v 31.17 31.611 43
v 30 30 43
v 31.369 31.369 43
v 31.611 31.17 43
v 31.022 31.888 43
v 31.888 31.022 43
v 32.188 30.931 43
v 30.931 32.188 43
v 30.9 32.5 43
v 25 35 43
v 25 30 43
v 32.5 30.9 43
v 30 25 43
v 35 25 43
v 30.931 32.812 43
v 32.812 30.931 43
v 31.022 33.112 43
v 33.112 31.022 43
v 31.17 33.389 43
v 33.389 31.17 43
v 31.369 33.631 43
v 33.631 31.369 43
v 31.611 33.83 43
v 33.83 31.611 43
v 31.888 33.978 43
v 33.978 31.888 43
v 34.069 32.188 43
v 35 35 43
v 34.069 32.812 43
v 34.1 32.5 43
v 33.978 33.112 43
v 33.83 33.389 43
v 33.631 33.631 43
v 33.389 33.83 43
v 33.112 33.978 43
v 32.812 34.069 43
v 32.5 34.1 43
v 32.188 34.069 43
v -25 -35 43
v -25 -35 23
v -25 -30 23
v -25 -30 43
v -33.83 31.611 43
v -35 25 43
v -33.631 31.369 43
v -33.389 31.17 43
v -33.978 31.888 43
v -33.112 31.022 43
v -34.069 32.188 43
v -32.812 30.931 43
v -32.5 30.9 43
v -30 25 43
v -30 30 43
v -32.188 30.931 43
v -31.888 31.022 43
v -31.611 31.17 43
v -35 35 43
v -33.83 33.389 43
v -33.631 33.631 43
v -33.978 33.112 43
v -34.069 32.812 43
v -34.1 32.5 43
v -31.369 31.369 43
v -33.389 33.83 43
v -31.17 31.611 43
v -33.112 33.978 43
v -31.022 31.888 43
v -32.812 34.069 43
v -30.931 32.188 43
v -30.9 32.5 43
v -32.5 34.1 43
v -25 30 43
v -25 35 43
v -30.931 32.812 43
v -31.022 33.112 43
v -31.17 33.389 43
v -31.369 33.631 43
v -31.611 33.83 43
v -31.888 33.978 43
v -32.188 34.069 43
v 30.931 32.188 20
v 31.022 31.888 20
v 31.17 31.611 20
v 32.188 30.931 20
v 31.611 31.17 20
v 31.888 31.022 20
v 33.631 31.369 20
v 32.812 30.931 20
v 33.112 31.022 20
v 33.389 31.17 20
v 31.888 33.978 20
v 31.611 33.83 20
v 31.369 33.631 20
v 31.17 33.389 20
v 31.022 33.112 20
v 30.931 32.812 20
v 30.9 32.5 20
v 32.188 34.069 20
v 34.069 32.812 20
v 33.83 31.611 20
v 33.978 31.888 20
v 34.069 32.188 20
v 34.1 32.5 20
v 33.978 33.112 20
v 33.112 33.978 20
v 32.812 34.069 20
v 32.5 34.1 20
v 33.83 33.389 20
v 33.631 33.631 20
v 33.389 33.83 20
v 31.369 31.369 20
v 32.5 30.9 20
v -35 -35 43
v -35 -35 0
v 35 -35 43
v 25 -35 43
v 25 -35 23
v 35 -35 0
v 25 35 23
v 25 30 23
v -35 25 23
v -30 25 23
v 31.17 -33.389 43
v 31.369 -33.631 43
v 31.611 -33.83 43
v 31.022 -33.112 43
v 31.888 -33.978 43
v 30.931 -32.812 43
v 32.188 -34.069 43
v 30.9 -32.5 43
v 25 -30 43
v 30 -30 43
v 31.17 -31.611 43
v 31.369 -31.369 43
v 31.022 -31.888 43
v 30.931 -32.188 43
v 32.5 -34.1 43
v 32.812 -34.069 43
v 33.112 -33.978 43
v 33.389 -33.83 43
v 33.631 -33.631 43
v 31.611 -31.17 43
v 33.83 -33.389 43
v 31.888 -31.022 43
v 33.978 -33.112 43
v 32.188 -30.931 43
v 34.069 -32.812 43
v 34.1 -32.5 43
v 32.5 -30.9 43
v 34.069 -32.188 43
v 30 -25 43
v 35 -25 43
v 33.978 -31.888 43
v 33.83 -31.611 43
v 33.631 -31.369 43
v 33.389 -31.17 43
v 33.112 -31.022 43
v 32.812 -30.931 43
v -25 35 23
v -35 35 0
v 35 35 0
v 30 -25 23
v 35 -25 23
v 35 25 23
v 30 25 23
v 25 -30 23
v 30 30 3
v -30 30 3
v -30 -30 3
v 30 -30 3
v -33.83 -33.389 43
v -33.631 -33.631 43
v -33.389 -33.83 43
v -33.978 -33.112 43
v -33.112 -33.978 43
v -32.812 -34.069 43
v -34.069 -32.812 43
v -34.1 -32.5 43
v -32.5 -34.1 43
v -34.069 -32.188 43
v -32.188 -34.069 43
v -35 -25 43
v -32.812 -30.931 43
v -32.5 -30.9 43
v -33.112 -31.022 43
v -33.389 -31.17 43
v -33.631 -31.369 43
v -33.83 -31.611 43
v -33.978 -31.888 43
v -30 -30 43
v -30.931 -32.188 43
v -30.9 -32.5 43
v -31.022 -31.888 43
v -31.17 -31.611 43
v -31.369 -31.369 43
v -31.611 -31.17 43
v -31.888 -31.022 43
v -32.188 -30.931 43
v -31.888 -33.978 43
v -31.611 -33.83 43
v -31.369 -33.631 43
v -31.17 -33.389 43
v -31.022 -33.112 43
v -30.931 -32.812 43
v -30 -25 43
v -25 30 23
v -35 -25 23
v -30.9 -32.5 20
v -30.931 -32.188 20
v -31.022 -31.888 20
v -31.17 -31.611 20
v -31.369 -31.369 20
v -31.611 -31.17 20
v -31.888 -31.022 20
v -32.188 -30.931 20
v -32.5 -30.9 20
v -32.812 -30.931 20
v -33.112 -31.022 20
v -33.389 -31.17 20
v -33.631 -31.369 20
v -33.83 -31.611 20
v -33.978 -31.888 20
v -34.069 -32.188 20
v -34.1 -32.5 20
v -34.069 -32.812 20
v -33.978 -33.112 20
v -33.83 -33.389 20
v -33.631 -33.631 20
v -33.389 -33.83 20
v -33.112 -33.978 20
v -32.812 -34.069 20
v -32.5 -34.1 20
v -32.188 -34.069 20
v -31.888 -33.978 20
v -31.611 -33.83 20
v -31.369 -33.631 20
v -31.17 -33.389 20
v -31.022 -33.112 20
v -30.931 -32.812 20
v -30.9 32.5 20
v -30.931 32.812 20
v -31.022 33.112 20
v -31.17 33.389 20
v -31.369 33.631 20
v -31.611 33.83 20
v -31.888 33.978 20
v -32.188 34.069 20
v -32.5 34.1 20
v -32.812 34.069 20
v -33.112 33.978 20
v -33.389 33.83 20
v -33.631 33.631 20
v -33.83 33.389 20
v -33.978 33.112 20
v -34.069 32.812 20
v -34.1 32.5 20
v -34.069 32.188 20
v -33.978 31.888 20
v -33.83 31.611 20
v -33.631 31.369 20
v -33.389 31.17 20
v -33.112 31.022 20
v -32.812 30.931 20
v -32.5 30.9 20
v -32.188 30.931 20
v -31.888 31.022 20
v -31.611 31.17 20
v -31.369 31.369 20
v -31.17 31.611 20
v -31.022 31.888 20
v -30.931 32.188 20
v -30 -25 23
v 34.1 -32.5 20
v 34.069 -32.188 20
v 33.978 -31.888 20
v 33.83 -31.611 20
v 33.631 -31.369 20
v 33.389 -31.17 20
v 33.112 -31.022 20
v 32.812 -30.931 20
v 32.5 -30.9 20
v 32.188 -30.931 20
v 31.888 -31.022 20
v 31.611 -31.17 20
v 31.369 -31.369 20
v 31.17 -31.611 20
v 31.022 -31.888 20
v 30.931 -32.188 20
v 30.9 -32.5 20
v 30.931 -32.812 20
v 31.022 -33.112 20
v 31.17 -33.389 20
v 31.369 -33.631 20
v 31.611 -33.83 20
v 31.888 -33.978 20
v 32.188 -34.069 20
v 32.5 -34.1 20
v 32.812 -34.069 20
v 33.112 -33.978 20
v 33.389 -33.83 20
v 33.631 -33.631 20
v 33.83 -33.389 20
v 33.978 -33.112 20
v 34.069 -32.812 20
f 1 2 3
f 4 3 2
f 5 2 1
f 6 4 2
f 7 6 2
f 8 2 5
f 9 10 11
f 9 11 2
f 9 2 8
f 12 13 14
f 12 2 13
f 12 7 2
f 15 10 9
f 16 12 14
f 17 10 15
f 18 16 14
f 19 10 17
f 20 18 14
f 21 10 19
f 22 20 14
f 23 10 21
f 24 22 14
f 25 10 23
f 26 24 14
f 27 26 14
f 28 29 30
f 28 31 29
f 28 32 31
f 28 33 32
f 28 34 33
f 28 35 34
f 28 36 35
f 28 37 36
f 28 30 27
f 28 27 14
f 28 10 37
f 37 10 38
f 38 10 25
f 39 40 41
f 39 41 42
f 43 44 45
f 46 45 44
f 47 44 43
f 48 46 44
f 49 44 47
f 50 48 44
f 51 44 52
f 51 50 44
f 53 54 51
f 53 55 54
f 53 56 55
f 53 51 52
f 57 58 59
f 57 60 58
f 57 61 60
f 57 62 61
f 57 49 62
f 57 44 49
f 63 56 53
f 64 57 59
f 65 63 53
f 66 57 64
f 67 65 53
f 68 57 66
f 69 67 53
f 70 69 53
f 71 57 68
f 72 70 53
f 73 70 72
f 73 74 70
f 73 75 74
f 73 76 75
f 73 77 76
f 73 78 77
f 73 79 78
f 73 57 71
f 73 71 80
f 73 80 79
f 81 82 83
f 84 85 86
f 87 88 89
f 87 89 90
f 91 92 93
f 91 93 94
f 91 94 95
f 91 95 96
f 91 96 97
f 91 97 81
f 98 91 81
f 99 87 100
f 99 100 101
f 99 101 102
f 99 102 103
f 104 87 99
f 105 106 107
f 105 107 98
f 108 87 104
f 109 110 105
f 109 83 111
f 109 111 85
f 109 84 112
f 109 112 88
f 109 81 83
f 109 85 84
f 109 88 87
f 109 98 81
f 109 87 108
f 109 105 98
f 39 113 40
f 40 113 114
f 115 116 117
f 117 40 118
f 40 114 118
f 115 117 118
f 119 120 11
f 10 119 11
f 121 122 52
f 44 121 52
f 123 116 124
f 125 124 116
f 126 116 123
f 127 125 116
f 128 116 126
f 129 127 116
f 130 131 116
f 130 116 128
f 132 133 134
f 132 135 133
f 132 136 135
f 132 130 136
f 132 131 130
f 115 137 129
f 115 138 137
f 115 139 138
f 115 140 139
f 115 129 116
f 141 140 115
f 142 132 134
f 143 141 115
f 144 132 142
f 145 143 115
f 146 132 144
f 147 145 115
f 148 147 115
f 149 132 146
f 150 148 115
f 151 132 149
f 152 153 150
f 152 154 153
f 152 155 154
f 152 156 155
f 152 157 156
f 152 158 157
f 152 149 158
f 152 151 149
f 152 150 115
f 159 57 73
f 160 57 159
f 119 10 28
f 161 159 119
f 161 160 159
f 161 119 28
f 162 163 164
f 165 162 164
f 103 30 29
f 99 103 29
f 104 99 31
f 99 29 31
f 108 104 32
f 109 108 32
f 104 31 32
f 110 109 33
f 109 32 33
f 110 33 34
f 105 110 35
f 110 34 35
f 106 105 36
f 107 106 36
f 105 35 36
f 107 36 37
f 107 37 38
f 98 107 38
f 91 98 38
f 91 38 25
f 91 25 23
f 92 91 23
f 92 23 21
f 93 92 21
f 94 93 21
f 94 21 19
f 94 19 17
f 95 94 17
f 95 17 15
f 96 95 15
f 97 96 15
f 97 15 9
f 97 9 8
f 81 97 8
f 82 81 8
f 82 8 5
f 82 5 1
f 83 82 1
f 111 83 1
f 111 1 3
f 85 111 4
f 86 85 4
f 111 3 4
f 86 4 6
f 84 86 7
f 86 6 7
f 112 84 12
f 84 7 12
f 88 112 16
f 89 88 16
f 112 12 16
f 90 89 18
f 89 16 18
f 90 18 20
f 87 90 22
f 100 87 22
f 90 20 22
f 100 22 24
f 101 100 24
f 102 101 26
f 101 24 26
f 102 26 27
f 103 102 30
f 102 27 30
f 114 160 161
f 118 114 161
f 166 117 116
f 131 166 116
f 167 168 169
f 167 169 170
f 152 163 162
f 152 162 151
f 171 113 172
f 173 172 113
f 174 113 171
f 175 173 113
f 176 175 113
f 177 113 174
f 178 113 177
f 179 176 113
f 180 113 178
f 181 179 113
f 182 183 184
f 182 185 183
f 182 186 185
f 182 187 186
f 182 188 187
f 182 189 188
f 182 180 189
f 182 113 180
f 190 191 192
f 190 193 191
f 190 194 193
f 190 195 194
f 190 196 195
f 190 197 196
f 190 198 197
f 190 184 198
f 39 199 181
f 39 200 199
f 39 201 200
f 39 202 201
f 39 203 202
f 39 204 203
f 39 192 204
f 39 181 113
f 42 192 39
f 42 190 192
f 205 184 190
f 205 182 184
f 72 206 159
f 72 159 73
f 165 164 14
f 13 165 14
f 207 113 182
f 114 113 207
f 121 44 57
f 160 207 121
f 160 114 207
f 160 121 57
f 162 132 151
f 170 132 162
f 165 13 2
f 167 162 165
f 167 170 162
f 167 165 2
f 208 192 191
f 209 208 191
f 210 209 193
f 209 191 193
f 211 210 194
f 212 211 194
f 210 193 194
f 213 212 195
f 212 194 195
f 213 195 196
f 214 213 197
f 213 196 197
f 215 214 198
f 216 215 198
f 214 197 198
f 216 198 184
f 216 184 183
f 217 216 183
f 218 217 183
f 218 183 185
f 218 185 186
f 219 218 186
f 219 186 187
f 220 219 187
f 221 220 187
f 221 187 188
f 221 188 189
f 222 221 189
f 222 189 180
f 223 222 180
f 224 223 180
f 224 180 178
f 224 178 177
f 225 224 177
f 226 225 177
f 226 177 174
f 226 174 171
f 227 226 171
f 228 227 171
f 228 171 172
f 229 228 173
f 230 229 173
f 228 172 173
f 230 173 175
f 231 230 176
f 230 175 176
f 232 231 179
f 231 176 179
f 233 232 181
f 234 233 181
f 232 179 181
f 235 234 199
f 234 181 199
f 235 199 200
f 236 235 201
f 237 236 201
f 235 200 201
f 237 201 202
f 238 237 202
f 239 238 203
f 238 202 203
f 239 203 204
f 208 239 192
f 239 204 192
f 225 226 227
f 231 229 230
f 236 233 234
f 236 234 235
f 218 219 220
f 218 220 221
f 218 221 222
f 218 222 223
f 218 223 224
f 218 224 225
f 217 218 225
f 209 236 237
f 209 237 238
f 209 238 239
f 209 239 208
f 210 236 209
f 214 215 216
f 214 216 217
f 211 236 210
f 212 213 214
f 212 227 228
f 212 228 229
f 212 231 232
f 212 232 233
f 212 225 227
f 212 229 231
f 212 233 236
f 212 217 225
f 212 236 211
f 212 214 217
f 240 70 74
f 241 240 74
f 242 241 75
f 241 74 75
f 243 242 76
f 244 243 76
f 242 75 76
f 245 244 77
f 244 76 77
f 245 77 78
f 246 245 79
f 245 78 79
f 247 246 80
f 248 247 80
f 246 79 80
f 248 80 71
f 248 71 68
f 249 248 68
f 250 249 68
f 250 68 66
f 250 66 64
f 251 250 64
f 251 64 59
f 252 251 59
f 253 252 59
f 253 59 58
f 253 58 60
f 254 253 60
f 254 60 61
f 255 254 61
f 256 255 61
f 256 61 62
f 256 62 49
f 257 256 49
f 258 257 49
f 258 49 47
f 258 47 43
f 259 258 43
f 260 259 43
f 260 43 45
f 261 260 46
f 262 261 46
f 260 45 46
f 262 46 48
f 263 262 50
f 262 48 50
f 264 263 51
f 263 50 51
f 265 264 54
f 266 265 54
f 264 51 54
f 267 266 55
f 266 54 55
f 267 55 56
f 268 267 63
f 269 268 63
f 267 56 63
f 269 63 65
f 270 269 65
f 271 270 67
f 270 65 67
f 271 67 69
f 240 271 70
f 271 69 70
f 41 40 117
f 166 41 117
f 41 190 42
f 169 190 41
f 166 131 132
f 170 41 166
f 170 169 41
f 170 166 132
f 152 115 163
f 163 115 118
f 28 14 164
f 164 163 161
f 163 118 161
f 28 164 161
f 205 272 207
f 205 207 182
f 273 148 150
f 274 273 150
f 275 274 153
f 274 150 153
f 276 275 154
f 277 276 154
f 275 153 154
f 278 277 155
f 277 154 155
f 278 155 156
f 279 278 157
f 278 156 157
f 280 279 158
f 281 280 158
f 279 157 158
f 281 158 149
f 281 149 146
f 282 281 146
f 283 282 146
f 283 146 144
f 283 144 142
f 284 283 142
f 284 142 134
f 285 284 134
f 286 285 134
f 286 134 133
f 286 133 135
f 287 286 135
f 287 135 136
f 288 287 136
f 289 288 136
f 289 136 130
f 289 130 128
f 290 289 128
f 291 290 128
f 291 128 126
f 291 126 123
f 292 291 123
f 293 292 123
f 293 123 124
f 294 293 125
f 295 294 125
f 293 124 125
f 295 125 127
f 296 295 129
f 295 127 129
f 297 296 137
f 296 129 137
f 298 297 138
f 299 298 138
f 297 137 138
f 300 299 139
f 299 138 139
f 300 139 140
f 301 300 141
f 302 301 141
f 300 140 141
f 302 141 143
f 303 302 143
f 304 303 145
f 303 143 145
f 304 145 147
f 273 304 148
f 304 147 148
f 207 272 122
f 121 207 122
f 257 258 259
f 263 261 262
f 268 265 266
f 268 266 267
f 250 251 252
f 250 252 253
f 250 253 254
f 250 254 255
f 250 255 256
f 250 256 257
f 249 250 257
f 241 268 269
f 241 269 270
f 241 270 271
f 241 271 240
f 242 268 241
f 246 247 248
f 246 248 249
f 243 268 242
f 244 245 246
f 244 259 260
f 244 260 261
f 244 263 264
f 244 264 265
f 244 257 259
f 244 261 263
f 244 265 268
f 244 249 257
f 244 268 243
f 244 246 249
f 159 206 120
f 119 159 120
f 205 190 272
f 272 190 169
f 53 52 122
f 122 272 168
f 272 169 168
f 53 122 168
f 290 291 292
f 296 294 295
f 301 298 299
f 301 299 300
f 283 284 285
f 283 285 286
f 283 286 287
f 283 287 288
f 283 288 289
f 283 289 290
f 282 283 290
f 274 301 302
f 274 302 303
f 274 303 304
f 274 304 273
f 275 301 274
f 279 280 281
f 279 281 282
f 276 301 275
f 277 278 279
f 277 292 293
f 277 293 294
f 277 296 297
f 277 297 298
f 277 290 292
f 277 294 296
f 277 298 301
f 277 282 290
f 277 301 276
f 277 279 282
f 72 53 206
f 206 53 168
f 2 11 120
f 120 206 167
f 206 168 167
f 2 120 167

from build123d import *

# Parameters (mm, degrees)
F0_W      = 70
F0_H      = 70
F0_W_2    = 60
F0_H_2    = 60
F1_DEPTH  = 3
F2_W      = 70
F2_H      = 70
F2_W_2    = 60
F2_H_2    = 60
F3_DEPTH  = 40
F4_W      = 50
F4_H      = 20
F5_DEPTH  = 71
F6_W      = 50
F6_H      = 20
F7_DEPTH  = 70
F11_R     = 1.6
F12_DEPTH = 25


with BuildPart() as f1:
    # F0 (on Top) → F1 (new body)
    with BuildSketch(Plane.XY):
        Rectangle(F0_W, F0_H)
        Rectangle(F0_W_2, F0_H_2, mode=Mode.SUBTRACT)
        Rectangle(F0_W_2, F0_H_2)
    extrude(amount=F1_DEPTH)

    # F2 (on face) → F3 (join)
    with BuildSketch(Plane.XY.offset(3)):
        Rectangle(F2_W, F2_H)
        Rectangle(F2_W_2, F2_H_2, mode=Mode.SUBTRACT)
    extrude(amount=F3_DEPTH)

    # F4 (on face) → F5 (cut)
    with BuildSketch(Plane.XZ.offset(35)):
        with Locations((0, 33)):
            Rectangle(F4_W, F4_H)
    extrude(amount=-F5_DEPTH, mode=Mode.SUBTRACT)

    # F6 (on face) → F7 (cut)
    with BuildSketch(Plane.YZ.offset(35)):
        with Locations((0, 33)):
            Rectangle(F6_W, F6_H)
    extrude(amount=-F7_DEPTH, mode=Mode.SUBTRACT)

    # F11 (on offset) → F12 (cut)
    with BuildSketch(Plane.XY.offset(45)):
        with Locations((32.5, 32.5)):
            Circle(F11_R)
        with Locations((32.5, -32.5)):
            Circle(F11_R)
        with Locations((-32.5, 32.5)):
            Circle(F11_R)
        with Locations((-32.5, -32.5)):
            Circle(F11_R)
    extrude(amount=-F12_DEPTH, mode=Mode.SUBTRACT)


solid = f1.part
